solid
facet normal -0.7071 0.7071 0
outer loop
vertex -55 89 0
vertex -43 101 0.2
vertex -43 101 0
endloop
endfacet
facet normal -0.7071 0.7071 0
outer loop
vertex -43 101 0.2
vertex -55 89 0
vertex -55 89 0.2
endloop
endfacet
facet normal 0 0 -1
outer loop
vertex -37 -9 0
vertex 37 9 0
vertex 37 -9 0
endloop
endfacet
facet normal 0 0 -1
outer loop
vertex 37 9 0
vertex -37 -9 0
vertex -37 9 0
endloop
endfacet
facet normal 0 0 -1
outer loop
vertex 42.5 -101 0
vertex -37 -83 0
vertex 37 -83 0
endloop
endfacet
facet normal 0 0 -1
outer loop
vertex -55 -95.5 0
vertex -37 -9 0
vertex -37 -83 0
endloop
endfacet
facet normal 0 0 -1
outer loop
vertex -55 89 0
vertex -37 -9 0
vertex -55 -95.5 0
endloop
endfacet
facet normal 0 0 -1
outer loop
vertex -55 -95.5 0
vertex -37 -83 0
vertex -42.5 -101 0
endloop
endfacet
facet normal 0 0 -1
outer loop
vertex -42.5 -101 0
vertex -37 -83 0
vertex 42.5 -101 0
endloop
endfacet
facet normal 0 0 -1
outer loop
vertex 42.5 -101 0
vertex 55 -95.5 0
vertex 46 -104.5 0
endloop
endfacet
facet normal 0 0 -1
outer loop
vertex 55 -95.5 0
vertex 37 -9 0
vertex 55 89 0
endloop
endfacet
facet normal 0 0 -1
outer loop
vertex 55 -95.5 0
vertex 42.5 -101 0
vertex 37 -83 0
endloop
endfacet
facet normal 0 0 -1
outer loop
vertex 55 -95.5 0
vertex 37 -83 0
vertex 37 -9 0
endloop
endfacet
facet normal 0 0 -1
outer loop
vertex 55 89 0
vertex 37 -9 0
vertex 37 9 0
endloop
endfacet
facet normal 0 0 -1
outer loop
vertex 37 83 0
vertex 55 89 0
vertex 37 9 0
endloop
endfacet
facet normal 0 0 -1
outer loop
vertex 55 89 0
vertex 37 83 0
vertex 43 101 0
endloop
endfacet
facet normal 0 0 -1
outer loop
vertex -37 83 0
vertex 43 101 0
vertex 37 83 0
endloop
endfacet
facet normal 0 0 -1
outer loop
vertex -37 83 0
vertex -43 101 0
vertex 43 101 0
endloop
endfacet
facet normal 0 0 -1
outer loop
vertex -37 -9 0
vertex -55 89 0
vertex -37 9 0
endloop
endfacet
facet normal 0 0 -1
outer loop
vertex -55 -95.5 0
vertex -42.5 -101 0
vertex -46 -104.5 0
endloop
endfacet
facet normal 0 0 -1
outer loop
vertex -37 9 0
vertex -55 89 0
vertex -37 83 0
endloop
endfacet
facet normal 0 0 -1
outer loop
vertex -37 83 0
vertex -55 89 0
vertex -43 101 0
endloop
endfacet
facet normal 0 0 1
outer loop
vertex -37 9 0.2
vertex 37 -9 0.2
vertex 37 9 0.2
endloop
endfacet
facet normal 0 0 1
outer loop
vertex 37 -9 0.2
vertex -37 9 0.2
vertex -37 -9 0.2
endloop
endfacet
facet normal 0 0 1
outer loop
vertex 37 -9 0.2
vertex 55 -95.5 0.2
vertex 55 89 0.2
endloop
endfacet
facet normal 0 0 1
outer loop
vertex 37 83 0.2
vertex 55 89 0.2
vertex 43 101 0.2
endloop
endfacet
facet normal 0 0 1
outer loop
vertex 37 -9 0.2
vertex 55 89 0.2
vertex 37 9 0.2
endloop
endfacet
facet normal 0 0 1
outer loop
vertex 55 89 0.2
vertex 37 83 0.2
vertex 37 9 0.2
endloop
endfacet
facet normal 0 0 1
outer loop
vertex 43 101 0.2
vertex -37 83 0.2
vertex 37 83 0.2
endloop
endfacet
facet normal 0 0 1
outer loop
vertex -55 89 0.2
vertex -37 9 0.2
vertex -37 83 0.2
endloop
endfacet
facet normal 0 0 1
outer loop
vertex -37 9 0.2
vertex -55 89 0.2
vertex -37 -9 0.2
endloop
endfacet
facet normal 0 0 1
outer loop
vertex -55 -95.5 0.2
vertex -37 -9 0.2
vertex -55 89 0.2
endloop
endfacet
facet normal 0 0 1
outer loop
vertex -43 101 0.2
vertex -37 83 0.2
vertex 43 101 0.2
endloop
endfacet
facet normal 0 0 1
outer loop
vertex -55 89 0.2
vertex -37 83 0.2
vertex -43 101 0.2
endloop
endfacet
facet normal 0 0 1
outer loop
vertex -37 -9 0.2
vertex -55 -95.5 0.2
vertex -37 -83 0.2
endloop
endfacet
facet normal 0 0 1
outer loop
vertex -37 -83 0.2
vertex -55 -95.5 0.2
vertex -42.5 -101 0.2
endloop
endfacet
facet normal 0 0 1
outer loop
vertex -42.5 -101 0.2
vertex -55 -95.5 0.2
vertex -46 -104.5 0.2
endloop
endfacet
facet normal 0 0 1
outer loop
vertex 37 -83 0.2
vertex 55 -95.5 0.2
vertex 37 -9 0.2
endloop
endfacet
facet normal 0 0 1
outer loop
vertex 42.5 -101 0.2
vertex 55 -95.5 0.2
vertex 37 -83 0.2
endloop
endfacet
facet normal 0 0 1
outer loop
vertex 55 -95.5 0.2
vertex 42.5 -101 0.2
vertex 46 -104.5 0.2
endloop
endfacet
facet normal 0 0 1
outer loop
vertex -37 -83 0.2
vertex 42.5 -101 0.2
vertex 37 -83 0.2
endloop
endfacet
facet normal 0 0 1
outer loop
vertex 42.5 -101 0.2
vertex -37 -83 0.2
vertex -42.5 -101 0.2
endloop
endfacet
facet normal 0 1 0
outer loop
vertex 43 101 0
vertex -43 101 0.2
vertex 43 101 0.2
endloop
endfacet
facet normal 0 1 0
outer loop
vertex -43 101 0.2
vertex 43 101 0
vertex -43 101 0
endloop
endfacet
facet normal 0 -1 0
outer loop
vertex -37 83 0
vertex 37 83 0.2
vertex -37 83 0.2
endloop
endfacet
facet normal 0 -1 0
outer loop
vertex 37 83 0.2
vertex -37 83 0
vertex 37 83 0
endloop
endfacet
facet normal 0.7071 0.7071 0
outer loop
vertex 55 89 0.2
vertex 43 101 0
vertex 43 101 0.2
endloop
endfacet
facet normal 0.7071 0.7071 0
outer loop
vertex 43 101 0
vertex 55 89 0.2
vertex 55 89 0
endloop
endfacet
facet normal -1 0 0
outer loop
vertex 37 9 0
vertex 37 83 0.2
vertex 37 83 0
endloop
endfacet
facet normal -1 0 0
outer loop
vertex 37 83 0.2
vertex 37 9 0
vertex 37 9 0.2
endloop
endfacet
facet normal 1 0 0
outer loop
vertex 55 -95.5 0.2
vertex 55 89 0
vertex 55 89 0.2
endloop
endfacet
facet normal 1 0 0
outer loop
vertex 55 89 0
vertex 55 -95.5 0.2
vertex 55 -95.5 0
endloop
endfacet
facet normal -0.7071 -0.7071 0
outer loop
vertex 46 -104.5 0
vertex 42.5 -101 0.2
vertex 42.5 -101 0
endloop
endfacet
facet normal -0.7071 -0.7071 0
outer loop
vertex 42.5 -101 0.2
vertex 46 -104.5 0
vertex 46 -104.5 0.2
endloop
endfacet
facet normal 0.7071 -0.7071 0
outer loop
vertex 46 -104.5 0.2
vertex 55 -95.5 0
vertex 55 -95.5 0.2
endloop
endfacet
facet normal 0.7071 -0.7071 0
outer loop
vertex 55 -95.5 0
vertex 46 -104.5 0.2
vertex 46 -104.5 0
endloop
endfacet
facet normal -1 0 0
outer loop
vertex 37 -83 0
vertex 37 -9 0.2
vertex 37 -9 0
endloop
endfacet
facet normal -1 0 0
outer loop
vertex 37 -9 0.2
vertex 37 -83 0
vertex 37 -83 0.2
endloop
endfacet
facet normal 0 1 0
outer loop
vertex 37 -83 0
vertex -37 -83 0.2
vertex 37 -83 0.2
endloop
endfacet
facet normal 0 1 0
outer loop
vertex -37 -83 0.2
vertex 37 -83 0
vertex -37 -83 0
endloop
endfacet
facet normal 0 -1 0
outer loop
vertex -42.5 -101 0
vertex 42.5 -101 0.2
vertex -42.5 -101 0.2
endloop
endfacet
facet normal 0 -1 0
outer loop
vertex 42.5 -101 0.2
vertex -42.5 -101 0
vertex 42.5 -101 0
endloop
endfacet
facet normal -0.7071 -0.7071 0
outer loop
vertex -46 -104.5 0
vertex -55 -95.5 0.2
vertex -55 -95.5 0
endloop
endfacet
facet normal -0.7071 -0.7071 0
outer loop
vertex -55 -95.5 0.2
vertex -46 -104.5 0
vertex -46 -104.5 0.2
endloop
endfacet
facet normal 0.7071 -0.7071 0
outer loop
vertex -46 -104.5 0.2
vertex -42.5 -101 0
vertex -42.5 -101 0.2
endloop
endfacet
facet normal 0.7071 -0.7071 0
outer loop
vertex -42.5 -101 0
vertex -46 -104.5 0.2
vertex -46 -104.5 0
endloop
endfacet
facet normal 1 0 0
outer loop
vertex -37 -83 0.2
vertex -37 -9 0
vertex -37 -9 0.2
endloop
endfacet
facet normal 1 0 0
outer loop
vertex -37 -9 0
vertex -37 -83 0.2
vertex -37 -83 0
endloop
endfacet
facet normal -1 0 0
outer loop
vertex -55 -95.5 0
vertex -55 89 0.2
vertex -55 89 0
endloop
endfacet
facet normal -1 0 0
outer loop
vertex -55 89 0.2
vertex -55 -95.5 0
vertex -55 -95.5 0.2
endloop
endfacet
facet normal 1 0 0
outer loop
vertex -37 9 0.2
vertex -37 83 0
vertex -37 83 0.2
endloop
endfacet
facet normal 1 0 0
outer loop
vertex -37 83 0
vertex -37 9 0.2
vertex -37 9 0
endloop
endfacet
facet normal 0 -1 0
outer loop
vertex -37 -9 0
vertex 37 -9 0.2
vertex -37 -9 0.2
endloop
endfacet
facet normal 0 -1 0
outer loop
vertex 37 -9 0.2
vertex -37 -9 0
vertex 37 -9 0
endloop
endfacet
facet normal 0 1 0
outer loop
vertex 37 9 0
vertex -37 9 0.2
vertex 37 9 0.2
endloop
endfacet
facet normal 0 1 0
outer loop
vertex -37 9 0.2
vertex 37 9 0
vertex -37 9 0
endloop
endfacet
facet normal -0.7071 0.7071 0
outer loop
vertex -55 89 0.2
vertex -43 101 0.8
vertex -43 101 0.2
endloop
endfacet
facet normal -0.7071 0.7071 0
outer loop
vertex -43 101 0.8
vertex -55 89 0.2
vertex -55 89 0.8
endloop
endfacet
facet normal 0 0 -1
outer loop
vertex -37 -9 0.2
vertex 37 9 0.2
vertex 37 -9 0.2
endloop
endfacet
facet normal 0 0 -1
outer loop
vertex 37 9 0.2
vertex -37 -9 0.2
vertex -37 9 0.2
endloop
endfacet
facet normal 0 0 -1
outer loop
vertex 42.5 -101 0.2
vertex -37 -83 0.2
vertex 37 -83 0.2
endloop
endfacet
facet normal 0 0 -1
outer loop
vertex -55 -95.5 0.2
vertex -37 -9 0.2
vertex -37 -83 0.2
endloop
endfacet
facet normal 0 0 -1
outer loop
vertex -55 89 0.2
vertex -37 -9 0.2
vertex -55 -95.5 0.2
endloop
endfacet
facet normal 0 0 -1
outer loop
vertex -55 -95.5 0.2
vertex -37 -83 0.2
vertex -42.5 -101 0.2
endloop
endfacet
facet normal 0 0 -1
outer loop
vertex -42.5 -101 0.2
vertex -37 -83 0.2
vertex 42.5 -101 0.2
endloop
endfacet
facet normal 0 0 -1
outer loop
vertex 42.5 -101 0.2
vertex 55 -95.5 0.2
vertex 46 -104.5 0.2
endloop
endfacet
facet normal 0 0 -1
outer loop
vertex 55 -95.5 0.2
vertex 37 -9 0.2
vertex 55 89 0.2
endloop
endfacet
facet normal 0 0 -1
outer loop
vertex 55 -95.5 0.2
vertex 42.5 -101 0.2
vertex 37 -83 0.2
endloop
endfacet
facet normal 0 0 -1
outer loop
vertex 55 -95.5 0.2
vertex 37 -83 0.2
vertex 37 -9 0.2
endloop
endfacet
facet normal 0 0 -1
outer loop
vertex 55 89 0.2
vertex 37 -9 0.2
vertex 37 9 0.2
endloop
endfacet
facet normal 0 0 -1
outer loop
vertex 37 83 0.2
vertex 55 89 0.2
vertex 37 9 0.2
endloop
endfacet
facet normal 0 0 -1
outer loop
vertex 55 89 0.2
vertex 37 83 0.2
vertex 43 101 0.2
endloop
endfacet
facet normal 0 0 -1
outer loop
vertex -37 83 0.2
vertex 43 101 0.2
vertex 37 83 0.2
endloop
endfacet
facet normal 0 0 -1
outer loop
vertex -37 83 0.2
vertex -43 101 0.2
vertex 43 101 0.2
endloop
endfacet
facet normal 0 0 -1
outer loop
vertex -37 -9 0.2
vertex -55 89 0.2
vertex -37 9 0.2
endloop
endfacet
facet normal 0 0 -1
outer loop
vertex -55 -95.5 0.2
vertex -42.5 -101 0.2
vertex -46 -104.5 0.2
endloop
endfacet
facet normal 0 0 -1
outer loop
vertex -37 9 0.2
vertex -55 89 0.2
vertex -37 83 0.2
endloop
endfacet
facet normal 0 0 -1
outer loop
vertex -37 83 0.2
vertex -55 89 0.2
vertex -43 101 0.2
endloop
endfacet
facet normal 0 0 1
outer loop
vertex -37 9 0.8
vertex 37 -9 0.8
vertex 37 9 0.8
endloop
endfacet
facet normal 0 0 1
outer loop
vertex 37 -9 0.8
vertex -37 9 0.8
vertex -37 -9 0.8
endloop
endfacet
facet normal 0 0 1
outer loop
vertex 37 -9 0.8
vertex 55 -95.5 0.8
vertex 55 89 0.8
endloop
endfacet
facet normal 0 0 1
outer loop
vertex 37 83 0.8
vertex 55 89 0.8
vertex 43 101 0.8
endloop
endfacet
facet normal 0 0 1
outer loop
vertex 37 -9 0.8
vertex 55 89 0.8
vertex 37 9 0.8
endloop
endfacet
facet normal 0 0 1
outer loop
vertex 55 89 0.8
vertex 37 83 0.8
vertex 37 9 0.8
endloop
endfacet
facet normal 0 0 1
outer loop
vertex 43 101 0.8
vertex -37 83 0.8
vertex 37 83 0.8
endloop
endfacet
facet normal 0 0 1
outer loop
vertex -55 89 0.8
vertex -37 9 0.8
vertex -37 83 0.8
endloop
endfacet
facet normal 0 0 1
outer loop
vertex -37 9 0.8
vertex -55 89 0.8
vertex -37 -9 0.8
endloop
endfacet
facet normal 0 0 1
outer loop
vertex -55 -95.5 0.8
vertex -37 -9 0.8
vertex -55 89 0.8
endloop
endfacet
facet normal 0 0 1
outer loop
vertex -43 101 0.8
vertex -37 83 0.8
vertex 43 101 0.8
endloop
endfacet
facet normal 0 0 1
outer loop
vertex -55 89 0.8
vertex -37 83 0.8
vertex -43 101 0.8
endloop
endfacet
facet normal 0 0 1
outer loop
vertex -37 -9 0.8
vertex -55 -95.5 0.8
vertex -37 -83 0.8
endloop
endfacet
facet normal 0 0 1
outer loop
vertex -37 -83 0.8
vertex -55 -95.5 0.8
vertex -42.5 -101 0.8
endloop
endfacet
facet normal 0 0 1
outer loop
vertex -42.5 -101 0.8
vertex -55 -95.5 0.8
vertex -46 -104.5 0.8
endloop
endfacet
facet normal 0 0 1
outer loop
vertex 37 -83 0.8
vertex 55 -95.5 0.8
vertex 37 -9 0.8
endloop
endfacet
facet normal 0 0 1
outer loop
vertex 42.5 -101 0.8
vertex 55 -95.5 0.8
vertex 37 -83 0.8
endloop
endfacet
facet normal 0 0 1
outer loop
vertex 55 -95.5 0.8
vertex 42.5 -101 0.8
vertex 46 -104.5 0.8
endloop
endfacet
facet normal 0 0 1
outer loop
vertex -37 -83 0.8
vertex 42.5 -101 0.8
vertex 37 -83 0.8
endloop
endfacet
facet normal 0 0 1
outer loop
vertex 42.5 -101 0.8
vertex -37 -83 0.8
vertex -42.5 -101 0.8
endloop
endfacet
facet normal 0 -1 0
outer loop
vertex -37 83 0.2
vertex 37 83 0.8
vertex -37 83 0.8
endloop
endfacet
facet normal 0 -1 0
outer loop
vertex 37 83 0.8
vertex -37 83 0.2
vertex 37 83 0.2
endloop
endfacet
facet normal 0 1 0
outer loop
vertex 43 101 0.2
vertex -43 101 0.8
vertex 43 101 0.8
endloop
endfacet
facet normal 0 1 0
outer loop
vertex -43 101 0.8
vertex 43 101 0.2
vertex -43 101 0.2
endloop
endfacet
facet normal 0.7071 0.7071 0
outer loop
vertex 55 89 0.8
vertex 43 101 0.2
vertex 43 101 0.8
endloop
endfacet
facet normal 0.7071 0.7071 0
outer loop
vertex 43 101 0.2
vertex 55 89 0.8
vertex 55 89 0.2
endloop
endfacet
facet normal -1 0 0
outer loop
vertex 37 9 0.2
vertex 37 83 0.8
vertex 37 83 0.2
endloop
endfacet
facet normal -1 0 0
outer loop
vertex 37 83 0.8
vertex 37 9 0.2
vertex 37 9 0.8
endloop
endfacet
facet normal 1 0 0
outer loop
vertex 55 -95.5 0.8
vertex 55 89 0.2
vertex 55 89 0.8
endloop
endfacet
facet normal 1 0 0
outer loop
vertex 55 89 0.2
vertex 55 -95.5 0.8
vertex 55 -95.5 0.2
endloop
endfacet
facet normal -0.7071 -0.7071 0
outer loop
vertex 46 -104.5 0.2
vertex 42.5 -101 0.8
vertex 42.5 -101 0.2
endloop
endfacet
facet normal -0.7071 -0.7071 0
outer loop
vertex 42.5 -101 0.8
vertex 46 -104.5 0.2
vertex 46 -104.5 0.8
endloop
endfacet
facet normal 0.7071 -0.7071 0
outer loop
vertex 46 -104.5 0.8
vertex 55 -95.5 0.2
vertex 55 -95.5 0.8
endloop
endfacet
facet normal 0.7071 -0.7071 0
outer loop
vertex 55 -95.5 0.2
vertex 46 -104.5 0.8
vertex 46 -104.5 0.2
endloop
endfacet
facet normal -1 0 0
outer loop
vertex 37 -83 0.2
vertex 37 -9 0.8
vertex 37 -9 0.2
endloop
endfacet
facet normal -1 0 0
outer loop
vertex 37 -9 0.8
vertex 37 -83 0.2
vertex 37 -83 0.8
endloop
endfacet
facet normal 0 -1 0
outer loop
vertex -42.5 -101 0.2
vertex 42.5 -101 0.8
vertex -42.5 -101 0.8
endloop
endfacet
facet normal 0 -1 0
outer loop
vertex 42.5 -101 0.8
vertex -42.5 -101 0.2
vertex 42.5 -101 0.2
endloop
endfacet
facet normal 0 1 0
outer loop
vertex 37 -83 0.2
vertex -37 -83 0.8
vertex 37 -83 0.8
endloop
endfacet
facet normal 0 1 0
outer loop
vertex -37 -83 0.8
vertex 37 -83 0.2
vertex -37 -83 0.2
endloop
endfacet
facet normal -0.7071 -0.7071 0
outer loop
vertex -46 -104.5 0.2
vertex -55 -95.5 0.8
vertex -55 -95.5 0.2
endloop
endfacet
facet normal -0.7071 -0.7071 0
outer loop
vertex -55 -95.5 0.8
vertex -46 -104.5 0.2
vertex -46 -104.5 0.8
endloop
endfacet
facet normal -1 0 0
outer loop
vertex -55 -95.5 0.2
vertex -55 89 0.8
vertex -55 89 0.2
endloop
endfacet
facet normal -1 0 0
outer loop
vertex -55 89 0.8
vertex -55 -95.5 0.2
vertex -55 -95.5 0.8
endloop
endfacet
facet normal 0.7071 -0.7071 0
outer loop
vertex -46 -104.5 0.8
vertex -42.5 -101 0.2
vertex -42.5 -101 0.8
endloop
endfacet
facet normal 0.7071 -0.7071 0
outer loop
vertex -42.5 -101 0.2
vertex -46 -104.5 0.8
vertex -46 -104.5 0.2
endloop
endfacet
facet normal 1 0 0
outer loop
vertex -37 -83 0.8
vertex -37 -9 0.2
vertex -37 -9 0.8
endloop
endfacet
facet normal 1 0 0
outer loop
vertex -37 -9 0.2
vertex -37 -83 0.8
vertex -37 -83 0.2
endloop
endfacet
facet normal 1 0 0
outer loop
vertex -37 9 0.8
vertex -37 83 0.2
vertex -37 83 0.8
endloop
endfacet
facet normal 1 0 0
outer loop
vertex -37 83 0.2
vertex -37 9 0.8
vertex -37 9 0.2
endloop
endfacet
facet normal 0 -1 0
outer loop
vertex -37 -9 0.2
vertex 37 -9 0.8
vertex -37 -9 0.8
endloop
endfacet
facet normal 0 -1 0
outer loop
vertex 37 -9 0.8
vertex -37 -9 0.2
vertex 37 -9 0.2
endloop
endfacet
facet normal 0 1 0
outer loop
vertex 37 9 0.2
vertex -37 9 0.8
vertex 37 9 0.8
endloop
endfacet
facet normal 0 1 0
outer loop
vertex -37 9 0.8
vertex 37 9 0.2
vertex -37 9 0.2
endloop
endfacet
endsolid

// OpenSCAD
// =========================================================================
// 7-Segment Dual-Material Diffuser (0.8 mm Total Thickness)
// Layer 1 (0.0 to 0.2 mm) = White Filament (100% surface diffusion)
// Layer 2 (0.2 to 0.8 mm) = Transparent / Clear Filament (Structural core)
// =========================================================================

// --- Configuration Parameters ---
pitch_x         = 92.0;   // Horizontal pitch between vertical columns
pitch_y_top     = 92.0;   // Pitch between middle & top horizontal segments
pitch_y_bot     = 92.0;   // Pitch between middle & bottom horizontal segments

total_seg_w     = 18.0;   // Segment width (18mm)
total_seg_l_x   = 104.0;  // Horizontal segment length (A, D, G)
total_seg_l_y_top = 104.0;// Top vertical segment length (B, F)
total_seg_l_y_bot = 117.0;// Bottom vertical segment length (C, E)

layer1_thick    = 0.2;    // First layer: 0.20 mm White
total_thick     = 0.8;    // Total thickness: 0.80 mm (0.6mm Transparent backing)

// --- Render Selection ---
render_part = 0; // 0: Dual-color assembly preview
                 // 1: White layer only (export STL)
                 // 2: Transparent layer only (export STL)
                 // 3: Single solid 0.8mm piece (export STL for slicer layer-pause)

// --- Segment Polygon Generator ---
module segment_shape(l, w, h) {
    linear_extrude(height = h)
    polygon([
        [-l/2, 0],
        [-l/2 + w/2, -w/2],
        [l/2 - w/2, -w/2],
        [l/2, 0],
        [l/2 - w/2, w/2],
        [-l/2 + w/2, w/2]
    ]);
}

// --- 7-Segment Layout Helpers ---
module layout_7segments(h) {
    // 1. Segment A (Top)
    translate([0, pitch_y_top, 0]) 
        segment_shape(total_seg_l_x, total_seg_w, h);

    // 2. Segment B (Top-Right)
    translate([pitch_x/2, pitch_y_top/2, 0]) rotate([0, 0, 90]) 
        segment_shape(total_seg_l_y_top, total_seg_w, h);

    // 3. Segment C (Bottom-Right)
    translate([pitch_x/2, -pitch_y_bot/2, 0]) rotate([0, 0, 90]) 
        segment_shape(total_seg_l_y_bot, total_seg_w, h);

    // 4. Segment D (Bottom)
    translate([0, -pitch_y_bot, 0]) 
        segment_shape(total_seg_l_x, total_seg_w, h);

    // 5. Segment E (Bottom-Left)
    translate([-pitch_x/2, -pitch_y_bot/2, 0]) rotate([0, 0, 90]) 
        segment_shape(total_seg_l_y_bot, total_seg_w, h);

    // 6. Segment F (Top-Left)
    translate([-pitch_x/2, pitch_y_top/2, 0]) rotate([0, 0, 90]) 
        segment_shape(total_seg_l_y_top, total_seg_w, h);

    // 7. Segment G (Middle)
    translate([0, 0, 0]) 
        segment_shape(total_seg_l_x, total_seg_w, h);
}

// --- White Layer (0.0 to 0.2 mm) ---
module diffuser_white() {
    color("White")
        layout_7segments(layer1_thick);
}

// --- Transparent Layer (0.2 to 0.8 mm) ---
module diffuser_transparent() {
    color("Cyan", 0.5) // Transparent cyan preview
        translate([0, 0, layer1_thick])
            layout_7segments(total_thick - layer1_thick);
}

// --- Assembly Rendering ---
if (render_part == 0) {
    diffuser_white();
    diffuser_transparent();
} else if (render_part == 1) {
    diffuser_white();
} else if (render_part == 2) {
    diffuser_transparent();
} else if (render_part == 3) {
    color("GhostWhite")
        layout_7segments(total_thick);
}
